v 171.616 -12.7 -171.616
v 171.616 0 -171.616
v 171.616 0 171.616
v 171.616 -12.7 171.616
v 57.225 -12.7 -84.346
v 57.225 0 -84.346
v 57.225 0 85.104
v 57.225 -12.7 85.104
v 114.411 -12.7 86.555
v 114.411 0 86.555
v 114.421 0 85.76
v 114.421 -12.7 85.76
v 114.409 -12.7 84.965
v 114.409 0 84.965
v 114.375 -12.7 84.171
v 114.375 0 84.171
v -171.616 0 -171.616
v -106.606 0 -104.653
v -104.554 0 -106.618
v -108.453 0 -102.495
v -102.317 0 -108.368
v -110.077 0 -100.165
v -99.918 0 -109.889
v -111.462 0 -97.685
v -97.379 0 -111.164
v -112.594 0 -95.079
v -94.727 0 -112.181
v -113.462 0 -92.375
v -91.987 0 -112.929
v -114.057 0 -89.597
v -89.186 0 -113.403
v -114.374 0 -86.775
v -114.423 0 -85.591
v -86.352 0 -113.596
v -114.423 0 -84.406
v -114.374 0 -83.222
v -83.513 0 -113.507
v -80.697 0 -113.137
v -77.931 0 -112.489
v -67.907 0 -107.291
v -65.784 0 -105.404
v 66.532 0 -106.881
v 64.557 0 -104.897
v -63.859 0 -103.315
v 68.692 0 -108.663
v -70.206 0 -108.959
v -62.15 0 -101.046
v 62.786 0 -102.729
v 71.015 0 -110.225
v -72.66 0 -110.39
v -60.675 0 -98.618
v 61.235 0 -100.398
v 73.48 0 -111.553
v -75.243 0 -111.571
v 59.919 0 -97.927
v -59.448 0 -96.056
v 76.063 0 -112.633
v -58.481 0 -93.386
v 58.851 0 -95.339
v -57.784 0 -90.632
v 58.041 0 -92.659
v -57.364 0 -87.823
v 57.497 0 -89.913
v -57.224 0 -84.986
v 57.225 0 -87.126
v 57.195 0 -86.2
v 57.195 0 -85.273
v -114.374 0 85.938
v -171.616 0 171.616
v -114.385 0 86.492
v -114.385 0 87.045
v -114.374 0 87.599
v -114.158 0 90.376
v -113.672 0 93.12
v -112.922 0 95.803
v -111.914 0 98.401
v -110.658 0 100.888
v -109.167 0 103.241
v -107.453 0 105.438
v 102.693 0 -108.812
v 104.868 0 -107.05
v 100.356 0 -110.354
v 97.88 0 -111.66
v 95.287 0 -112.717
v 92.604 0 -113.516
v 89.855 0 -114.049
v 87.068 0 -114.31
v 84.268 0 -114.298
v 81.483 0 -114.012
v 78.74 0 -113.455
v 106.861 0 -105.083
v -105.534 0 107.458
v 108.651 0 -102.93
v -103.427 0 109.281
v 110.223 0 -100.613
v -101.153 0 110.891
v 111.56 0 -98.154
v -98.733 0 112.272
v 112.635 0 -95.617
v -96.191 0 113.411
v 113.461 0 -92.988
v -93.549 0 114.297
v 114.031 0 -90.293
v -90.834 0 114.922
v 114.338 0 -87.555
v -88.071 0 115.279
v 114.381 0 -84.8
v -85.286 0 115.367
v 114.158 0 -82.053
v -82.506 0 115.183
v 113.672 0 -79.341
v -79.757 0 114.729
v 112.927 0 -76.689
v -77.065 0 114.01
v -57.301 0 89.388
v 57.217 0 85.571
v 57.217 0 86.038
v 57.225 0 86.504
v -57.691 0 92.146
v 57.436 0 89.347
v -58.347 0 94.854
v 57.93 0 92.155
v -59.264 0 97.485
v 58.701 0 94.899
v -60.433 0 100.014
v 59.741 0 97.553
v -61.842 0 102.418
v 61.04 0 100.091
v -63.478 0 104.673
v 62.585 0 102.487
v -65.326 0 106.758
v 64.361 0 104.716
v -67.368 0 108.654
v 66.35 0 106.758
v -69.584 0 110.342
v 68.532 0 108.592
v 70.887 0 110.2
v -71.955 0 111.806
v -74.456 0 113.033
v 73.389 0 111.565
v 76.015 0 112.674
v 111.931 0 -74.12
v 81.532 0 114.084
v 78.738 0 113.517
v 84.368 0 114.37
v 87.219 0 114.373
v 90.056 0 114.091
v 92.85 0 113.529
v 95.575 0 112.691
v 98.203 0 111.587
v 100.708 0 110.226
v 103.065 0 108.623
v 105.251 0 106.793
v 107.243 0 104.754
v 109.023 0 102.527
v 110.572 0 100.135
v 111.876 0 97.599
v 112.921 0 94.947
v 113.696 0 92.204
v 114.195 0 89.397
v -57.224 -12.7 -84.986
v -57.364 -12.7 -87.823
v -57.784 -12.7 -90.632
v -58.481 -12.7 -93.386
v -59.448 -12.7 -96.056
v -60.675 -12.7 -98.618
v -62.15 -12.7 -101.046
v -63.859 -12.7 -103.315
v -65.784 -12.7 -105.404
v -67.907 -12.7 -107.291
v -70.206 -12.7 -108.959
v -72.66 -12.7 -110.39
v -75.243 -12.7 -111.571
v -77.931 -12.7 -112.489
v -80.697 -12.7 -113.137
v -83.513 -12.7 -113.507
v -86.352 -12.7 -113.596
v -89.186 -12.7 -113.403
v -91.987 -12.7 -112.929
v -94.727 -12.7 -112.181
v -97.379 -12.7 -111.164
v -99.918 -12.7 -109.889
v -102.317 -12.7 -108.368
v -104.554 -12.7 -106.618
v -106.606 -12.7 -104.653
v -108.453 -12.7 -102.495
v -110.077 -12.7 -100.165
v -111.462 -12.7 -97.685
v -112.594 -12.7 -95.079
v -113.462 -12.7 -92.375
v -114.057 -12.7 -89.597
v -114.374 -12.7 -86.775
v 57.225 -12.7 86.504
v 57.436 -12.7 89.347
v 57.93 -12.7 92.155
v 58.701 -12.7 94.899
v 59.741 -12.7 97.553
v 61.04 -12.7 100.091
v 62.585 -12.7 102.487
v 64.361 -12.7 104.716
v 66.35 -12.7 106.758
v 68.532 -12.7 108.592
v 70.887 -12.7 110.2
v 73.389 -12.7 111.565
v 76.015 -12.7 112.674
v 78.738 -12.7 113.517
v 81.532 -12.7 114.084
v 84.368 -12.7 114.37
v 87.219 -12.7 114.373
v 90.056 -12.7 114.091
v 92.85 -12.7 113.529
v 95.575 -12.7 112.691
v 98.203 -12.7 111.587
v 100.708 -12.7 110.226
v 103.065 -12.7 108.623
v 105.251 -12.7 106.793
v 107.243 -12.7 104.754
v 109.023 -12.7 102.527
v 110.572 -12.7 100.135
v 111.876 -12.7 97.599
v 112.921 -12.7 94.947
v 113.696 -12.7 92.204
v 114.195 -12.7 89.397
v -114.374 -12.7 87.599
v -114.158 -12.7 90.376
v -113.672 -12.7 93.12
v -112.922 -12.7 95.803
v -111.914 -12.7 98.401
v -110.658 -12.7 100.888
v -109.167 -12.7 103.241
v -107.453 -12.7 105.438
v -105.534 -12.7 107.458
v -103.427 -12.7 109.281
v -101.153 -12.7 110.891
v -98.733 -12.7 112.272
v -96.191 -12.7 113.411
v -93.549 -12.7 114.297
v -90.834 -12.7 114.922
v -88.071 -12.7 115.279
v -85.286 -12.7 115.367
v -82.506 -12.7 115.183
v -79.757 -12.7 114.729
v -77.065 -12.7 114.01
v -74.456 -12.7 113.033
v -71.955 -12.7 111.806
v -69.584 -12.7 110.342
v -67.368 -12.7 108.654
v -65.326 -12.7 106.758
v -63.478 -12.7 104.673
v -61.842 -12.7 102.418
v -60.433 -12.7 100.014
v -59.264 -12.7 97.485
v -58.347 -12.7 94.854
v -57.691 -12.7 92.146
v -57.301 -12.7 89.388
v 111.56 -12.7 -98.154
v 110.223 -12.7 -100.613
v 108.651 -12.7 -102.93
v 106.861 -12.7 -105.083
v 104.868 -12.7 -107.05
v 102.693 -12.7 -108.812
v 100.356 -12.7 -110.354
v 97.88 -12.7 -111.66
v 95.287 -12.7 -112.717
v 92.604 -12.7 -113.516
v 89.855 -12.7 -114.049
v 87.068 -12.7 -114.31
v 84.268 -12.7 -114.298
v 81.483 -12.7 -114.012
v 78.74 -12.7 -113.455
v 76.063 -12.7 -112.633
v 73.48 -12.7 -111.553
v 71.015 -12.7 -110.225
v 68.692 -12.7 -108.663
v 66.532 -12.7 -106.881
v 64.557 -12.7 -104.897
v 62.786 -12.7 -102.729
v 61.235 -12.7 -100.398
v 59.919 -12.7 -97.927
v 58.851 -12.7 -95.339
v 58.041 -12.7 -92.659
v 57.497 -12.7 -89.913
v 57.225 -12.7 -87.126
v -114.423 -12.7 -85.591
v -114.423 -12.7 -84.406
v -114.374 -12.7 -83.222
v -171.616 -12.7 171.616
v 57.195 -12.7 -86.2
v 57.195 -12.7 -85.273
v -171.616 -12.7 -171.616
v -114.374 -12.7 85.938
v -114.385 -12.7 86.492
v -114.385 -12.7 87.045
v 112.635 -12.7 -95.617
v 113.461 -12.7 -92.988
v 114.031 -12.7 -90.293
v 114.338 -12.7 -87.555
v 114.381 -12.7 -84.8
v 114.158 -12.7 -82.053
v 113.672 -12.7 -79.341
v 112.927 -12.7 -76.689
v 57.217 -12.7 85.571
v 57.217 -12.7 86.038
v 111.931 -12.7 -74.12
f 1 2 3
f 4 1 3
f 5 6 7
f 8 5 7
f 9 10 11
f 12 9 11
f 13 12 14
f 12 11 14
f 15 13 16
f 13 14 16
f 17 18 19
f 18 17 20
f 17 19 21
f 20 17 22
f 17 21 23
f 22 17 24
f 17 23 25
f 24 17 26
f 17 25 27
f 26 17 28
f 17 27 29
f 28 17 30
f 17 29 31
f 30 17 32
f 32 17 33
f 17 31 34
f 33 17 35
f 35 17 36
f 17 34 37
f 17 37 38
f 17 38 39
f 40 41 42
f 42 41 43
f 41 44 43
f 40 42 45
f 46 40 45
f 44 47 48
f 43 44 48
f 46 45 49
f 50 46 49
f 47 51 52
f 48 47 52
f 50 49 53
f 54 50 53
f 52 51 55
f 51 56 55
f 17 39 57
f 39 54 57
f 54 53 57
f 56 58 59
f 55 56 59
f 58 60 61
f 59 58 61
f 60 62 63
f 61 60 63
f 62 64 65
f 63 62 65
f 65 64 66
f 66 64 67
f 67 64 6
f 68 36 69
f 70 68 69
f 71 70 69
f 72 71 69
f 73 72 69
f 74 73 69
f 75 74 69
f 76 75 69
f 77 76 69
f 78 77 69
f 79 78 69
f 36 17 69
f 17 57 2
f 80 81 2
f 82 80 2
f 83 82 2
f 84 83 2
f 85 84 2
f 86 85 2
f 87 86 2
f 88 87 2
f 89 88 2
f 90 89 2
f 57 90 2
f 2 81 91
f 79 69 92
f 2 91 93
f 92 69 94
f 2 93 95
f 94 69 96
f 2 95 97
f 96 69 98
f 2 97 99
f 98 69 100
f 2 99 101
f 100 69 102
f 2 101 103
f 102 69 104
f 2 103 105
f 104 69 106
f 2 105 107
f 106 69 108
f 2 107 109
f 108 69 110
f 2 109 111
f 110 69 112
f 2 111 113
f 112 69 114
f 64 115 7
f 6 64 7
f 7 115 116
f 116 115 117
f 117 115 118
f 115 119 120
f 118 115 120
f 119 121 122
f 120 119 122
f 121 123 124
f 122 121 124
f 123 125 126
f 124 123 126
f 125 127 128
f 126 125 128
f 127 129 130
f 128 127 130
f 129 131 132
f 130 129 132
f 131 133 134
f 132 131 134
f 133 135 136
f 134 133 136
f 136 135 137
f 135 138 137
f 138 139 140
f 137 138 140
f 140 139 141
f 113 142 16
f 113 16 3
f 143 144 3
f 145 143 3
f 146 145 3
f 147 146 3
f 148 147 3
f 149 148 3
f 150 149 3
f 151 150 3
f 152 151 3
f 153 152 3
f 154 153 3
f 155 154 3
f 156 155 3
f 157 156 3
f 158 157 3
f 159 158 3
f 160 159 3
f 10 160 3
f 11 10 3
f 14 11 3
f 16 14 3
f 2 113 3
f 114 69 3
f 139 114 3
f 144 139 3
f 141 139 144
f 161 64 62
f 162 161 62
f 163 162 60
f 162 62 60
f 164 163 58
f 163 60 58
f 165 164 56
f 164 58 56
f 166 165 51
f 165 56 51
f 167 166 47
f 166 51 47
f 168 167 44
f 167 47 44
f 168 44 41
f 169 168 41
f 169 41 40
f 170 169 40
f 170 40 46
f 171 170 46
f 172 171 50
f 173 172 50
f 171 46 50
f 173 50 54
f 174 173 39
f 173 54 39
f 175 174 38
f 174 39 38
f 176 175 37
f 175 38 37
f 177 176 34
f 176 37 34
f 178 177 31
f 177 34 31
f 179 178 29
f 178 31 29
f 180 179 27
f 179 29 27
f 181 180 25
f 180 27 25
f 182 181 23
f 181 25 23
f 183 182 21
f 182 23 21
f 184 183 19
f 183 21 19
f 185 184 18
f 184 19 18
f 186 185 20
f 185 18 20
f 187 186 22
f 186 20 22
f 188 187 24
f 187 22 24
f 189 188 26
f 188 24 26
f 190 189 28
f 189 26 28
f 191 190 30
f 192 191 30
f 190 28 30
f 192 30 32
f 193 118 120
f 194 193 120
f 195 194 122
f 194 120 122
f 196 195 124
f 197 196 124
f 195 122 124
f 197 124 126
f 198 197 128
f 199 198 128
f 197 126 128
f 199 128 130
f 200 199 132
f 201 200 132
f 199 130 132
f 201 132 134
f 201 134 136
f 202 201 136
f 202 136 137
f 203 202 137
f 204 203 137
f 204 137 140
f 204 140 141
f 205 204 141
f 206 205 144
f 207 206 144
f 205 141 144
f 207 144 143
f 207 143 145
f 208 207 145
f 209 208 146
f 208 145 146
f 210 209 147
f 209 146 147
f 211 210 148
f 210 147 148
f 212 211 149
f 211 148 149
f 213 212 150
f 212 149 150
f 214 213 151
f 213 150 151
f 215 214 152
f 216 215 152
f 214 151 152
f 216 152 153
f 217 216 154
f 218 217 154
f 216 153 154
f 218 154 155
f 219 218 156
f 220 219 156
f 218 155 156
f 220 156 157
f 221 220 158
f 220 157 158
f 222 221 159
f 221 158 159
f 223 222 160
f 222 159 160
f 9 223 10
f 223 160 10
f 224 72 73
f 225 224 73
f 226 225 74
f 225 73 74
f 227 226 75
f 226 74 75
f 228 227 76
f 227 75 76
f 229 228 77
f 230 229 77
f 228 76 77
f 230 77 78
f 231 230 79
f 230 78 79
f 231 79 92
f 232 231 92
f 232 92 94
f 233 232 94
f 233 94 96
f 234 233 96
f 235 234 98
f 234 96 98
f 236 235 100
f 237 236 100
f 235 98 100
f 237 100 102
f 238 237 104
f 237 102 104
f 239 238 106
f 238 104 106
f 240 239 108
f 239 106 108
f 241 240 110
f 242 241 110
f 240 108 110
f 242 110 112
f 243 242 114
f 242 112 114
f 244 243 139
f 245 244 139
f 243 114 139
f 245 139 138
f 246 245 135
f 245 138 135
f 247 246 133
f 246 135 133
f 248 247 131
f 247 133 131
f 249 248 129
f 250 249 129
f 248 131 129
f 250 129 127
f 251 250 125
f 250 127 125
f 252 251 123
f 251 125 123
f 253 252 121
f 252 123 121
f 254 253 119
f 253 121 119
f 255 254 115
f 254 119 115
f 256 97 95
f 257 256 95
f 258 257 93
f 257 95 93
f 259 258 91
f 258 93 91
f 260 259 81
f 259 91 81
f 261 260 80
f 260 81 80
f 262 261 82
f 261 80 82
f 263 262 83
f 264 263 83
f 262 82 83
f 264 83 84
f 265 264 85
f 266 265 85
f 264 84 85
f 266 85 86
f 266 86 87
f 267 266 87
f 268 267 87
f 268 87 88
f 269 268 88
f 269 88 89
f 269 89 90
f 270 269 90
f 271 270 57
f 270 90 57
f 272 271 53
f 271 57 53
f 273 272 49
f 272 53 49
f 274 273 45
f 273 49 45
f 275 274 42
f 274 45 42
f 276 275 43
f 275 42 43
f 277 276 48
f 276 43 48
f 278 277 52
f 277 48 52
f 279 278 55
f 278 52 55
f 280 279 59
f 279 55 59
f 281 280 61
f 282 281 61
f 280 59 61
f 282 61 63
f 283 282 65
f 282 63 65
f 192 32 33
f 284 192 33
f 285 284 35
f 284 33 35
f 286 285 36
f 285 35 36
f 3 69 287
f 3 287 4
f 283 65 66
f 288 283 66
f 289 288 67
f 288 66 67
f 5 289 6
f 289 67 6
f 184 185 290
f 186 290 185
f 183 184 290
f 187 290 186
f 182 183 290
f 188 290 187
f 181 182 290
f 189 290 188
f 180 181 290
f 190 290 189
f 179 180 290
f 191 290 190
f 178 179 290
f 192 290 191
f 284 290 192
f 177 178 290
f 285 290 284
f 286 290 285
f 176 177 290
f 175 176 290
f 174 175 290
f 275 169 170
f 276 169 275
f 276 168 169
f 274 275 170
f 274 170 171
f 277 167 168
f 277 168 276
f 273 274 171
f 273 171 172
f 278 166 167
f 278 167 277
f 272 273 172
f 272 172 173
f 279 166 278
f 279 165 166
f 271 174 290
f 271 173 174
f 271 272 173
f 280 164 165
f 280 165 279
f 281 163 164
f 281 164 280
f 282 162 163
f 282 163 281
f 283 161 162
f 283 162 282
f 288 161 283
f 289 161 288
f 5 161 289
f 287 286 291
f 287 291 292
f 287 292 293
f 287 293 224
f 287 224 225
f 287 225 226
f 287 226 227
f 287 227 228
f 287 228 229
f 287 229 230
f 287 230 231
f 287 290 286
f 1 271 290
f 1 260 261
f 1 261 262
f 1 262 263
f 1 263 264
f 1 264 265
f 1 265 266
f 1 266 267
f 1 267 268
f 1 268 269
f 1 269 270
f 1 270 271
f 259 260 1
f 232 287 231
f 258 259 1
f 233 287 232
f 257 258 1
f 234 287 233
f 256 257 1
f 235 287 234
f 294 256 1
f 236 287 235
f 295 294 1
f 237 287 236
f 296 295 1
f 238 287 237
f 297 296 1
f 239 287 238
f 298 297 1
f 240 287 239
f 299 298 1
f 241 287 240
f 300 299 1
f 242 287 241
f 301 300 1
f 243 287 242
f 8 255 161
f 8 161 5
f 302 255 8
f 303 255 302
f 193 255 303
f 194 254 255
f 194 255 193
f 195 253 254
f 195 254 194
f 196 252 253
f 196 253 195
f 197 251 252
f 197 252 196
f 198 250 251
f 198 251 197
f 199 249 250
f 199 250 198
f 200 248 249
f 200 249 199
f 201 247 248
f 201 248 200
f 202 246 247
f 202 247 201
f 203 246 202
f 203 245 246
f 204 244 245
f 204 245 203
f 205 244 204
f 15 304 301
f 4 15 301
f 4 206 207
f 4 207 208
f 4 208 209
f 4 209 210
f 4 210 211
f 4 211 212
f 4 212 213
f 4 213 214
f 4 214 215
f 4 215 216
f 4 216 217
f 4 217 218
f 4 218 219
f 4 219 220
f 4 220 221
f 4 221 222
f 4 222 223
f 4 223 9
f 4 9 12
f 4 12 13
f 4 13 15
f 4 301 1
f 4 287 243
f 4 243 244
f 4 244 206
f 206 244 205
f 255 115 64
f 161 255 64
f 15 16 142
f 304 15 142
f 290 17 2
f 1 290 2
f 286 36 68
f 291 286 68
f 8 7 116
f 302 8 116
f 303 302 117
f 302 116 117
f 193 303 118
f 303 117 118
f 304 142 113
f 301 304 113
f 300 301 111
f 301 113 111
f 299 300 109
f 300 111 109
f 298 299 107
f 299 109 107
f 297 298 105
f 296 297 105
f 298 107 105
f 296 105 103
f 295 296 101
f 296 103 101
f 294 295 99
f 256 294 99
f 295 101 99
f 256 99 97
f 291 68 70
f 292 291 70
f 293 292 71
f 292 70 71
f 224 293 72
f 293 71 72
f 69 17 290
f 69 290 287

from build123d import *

# Parameters (mm, degrees)
F0_W     = 343.231324
F0_H     = 343.231324
F1_DEPTH = 12.7


with BuildPart() as f1:
    # F0 (on Front) → F1 (new body)
    with BuildSketch(Plane.XZ):
        Rectangle(F0_W, F0_H)
        with BuildLine():
            ThreePointArc((-114.373991, 87.598695), (-86.679587, 115.357074), (-57.301, 89.38774))
            Line((-57.301, 89.38774), (-57.223991, -84.985509))
            ThreePointArc((-57.223991, -84.985509), (-84.931642, -113.586746), (-114.373991, -86.774572))
            ThreePointArc((-114.373991, -86.774572), (-114.429209, -84.998141), (-114.373991, -83.22171))
            Line((-114.373991, -83.22171), (-114.373991, 85.938318))
            ThreePointArc((-114.373991, 85.938318), (-114.386042, 86.768506), (-114.373991, 87.598695))
        make_face(mode=Mode.SUBTRACT)
        with BuildLine():
            ThreePointArc((114.411461, 86.554876), (114.417905, 85.362723), (114.374665, 84.171337))
            Line((114.374665, 84.171337), (111.931052, -74.1199))
            ThreePointArc((111.931052, -74.1199), (114.392674, -86.177603), (111.560034, -98.153576))
            ThreePointArc((111.560034, -98.153576), (80.104585, -113.767264), (57.224665, -87.126286))
            ThreePointArc((57.224665, -87.126286), (57.190861, -85.736104), (57.224665, -84.345923))
            Line((57.224665, -84.345923), (57.224665, 85.103969))
            ThreePointArc((57.224665, 85.103969), (57.216092, 85.804222), (57.224665, 86.504474))
            ThreePointArc((57.224665, 86.504474), (85.793493, 114.406821), (114.411461, 86.554876))
        make_face(mode=Mode.SUBTRACT)
    extrude(amount=F1_DEPTH)


solid = f1.part
